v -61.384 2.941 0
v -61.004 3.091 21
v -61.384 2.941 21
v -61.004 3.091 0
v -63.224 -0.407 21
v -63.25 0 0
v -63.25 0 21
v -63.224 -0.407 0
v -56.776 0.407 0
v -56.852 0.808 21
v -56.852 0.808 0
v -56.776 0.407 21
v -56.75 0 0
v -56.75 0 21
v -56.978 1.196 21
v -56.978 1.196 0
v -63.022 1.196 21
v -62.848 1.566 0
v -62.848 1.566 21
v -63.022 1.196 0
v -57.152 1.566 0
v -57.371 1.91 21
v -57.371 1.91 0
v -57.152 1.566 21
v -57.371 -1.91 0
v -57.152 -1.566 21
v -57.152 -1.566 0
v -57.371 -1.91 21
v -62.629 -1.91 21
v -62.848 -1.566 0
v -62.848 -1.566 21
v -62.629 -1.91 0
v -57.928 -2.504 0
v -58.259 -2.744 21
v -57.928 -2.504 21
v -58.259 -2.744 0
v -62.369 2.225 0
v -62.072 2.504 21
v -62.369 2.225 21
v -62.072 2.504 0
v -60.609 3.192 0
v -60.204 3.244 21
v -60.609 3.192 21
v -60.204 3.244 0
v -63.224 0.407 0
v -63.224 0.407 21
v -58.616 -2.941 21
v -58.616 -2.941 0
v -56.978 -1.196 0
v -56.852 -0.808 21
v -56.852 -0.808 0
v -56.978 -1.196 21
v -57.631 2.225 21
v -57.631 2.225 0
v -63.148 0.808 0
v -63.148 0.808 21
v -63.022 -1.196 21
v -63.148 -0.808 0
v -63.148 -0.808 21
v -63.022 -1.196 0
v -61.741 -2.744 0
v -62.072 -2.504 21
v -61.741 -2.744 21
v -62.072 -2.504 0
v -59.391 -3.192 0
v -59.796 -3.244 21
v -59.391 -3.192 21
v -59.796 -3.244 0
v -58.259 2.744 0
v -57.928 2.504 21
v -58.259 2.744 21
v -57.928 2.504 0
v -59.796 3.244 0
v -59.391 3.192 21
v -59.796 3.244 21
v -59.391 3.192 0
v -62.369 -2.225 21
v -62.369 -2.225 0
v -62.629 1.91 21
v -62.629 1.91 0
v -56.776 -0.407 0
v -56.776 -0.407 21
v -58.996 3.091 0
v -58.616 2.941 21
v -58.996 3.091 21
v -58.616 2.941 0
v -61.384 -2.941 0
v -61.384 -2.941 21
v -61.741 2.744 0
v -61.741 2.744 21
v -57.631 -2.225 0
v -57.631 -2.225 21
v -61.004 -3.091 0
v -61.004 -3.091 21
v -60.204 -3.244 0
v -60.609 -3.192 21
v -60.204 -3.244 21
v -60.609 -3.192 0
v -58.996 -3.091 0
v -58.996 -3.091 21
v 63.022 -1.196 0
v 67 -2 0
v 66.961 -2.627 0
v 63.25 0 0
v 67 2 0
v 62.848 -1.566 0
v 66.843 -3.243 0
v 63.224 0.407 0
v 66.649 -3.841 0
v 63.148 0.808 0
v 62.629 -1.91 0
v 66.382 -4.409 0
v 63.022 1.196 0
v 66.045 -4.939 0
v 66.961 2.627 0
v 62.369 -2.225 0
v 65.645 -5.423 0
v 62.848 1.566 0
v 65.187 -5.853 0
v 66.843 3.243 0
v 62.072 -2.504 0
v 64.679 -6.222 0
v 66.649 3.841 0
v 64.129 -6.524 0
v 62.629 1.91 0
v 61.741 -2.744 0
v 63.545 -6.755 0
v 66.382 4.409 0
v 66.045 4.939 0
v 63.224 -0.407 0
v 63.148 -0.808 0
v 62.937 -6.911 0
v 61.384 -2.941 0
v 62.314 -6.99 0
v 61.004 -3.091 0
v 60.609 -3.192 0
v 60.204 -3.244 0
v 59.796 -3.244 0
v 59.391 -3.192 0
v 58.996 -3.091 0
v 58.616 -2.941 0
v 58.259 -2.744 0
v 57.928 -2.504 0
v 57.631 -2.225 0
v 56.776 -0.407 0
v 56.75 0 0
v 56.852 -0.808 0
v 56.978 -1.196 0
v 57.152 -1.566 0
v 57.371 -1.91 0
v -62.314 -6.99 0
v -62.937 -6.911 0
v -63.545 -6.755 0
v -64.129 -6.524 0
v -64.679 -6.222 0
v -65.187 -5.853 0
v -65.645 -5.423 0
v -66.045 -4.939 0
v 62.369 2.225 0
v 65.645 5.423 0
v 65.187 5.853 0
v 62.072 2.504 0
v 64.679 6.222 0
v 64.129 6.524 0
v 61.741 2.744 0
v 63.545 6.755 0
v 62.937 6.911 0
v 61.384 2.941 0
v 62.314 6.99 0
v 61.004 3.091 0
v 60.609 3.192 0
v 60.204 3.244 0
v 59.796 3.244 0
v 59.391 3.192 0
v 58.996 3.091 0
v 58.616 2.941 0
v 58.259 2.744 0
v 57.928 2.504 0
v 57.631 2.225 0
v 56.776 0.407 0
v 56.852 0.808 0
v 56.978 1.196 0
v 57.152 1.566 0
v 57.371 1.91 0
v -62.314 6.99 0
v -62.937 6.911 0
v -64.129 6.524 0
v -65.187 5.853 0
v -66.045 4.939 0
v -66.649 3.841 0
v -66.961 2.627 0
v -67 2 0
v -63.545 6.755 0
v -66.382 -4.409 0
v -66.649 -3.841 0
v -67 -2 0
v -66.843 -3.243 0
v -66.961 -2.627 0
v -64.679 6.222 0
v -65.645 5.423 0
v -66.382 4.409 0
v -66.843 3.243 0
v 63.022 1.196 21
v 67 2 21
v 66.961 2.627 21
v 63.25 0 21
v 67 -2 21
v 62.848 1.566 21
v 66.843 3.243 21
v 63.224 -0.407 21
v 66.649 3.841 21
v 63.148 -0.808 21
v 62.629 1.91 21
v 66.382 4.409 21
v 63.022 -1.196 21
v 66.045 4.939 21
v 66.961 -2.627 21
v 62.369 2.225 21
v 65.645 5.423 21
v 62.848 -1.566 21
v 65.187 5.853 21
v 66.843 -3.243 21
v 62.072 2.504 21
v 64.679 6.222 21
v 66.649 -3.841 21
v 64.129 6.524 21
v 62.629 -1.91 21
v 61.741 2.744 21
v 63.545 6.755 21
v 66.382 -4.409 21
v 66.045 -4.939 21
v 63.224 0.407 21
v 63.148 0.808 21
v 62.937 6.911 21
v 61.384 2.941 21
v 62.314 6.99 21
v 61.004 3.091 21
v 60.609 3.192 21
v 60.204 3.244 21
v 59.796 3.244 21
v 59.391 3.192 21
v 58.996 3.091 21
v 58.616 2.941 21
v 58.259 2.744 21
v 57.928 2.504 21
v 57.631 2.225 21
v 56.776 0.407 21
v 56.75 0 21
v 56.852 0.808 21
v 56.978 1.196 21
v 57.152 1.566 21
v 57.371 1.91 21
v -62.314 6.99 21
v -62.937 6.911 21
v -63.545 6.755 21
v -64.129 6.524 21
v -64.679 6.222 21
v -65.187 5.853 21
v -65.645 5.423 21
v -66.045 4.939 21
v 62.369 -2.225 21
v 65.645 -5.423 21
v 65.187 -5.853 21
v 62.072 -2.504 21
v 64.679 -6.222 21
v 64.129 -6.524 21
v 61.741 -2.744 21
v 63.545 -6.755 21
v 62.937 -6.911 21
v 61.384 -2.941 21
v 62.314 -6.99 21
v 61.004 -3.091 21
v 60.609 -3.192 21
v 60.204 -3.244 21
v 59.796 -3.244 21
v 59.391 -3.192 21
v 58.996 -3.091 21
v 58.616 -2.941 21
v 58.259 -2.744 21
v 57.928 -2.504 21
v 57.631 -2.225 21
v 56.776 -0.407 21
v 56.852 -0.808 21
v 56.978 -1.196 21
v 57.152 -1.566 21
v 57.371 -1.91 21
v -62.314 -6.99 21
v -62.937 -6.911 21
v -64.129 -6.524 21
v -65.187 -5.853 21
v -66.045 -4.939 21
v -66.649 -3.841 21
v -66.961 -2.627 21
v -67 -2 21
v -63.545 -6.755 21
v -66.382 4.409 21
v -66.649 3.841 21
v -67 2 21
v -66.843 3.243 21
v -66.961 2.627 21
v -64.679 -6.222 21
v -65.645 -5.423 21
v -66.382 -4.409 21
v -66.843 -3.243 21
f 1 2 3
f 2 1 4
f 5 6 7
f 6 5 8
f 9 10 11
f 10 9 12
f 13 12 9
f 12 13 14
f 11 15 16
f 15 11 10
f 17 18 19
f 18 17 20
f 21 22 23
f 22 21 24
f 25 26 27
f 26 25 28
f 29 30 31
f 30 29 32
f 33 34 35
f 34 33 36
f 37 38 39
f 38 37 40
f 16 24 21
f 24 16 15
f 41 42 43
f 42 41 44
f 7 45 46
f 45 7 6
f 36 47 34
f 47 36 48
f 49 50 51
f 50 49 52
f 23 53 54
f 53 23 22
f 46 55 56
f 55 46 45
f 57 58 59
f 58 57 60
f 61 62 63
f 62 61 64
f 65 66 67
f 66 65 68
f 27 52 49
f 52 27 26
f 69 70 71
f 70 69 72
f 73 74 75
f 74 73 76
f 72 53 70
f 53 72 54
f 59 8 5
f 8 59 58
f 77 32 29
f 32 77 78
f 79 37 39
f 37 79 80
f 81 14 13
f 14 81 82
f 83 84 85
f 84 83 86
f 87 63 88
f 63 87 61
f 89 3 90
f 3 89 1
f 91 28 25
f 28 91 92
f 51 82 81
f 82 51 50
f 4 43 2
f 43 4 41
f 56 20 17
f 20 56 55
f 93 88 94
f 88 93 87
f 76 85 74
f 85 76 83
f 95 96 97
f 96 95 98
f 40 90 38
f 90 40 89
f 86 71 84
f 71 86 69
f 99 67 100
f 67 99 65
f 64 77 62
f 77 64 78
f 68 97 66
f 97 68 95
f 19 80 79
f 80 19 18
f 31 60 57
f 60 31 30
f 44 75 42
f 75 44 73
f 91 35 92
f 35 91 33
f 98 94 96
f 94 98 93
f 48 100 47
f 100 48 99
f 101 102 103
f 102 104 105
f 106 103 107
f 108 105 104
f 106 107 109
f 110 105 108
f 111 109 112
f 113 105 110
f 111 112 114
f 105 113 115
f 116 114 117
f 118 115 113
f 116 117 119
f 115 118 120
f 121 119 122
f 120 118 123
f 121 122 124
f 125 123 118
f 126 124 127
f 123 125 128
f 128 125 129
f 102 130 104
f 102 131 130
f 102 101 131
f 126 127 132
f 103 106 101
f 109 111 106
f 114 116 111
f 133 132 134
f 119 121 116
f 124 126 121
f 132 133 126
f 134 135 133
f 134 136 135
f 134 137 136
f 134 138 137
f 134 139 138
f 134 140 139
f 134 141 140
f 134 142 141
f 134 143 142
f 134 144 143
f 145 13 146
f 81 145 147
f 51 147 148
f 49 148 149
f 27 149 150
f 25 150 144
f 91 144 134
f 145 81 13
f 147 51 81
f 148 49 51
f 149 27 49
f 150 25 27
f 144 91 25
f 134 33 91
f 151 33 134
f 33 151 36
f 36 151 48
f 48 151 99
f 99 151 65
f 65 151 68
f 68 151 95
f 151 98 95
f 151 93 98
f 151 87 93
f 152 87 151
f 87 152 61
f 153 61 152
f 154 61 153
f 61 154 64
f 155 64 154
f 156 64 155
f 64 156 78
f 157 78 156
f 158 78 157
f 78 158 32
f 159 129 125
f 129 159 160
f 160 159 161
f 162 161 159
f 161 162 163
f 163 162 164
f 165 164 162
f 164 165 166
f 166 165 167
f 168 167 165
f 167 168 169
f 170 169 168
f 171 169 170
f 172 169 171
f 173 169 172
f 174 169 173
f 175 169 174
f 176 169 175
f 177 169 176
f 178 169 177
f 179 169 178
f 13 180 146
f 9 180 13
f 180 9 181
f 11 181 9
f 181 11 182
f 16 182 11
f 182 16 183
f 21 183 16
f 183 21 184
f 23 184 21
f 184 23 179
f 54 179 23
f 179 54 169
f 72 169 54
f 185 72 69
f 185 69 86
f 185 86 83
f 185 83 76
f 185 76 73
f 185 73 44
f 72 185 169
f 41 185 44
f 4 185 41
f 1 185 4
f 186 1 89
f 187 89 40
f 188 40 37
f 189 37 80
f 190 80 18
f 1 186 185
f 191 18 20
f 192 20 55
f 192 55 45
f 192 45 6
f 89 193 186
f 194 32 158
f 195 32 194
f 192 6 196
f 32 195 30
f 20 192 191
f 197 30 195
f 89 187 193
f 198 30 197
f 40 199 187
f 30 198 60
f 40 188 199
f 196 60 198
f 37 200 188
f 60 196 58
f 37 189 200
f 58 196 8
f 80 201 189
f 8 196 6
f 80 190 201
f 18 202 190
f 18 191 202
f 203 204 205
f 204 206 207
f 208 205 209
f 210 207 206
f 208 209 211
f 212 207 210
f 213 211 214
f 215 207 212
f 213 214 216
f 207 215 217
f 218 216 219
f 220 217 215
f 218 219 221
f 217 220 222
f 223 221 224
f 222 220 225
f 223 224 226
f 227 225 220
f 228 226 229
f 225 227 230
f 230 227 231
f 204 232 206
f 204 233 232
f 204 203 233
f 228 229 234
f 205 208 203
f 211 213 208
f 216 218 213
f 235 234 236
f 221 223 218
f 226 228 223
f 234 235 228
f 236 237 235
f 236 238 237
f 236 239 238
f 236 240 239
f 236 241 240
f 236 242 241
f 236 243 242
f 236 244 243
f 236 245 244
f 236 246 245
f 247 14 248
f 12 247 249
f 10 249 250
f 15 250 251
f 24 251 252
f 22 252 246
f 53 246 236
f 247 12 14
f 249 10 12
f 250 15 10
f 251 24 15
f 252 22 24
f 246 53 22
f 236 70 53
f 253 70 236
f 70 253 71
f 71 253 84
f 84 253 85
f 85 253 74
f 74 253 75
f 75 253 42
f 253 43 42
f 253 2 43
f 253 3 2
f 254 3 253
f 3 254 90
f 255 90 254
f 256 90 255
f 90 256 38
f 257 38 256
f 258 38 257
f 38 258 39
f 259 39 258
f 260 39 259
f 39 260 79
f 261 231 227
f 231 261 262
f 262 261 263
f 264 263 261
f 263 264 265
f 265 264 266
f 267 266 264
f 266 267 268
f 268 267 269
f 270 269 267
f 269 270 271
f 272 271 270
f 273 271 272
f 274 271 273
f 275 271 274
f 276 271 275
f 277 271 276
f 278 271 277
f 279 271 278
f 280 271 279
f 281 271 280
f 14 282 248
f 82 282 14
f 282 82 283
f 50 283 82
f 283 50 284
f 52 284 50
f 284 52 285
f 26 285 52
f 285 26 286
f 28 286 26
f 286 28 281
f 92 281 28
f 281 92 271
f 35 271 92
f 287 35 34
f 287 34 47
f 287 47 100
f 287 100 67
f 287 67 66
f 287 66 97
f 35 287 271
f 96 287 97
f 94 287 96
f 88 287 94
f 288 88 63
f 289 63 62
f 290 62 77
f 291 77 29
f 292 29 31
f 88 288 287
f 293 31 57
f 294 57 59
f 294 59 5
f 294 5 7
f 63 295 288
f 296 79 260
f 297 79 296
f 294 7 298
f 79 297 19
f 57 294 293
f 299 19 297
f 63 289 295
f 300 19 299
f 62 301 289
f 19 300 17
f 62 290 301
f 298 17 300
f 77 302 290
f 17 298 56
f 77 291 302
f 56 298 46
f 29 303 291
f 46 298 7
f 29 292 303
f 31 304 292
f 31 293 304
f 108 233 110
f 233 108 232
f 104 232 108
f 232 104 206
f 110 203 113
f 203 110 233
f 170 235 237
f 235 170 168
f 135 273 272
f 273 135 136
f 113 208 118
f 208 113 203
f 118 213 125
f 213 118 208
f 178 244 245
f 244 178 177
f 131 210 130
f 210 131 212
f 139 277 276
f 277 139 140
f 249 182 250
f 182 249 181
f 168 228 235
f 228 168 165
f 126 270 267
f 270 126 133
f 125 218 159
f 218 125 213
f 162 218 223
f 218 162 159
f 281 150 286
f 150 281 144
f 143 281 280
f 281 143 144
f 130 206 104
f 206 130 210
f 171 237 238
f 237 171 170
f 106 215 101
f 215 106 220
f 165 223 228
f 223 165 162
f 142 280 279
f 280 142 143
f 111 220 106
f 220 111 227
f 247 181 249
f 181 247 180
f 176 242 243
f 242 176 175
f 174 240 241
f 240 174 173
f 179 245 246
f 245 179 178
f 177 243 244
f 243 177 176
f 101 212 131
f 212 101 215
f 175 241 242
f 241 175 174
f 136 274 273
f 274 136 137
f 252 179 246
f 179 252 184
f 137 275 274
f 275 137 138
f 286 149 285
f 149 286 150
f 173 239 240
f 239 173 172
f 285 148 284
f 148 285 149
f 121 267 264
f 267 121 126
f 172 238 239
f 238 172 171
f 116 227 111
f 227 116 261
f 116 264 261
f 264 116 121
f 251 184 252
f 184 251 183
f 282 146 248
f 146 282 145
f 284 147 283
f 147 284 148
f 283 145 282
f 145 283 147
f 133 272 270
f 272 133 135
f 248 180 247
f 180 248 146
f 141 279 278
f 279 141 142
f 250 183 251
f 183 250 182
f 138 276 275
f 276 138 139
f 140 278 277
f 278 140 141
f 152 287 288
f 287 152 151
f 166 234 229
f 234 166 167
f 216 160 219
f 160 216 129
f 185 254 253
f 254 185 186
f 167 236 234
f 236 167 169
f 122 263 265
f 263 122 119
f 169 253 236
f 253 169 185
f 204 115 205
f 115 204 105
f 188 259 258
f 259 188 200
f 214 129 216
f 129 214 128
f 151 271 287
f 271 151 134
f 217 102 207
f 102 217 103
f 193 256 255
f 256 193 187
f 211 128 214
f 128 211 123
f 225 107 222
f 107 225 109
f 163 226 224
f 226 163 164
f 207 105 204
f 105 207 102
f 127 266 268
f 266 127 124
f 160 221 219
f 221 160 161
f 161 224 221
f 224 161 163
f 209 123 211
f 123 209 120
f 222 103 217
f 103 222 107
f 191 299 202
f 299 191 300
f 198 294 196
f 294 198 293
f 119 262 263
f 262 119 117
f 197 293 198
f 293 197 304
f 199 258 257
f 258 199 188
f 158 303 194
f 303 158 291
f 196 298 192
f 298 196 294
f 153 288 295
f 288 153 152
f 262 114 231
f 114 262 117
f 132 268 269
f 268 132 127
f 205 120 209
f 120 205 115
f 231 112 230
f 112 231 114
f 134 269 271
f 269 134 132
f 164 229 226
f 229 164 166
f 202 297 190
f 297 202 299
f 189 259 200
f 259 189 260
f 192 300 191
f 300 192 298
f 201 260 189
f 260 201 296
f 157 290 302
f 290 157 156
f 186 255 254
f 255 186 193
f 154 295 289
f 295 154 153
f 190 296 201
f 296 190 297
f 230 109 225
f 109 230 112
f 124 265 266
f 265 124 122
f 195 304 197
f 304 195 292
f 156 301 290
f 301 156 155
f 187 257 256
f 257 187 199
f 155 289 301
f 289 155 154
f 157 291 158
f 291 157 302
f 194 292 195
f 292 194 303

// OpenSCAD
$fn = 50;


difference() {
	union() {
		hull() {
			translate(v = [-62.0000000000, 2.0000000000, 0]) {
				cylinder(h = 21, r = 5);
			}
			translate(v = [62.0000000000, 2.0000000000, 0]) {
				cylinder(h = 21, r = 5);
			}
			translate(v = [-62.0000000000, -2.0000000000, 0]) {
				cylinder(h = 21, r = 5);
			}
			translate(v = [62.0000000000, -2.0000000000, 0]) {
				cylinder(h = 21, r = 5);
			}
		}
	}
	union() {
		translate(v = [-60.0000000000, 0.0000000000, 0]) {
			cylinder(h = 21, r = 3.2500000000);
		}
		translate(v = [60.0000000000, 0.0000000000, 0]) {
			cylinder(h = 21, r = 3.2500000000);
		}
		translate(v = [-60.0000000000, 0.0000000000, 0]) {
			cylinder(h = 21, r = 1.8000000000);
		}
		translate(v = [60.0000000000, 0.0000000000, 0]) {
			cylinder(h = 21, r = 1.8000000000);
		}
		translate(v = [-60.0000000000, 0.0000000000, 0]) {
			cylinder(h = 21, r = 1.8000000000);
		}
		translate(v = [60.0000000000, 0.0000000000, 0]) {
			cylinder(h = 21, r = 1.8000000000);
		}
		translate(v = [-60.0000000000, 0.0000000000, 0]) {
			cylinder(h = 21, r = 1.8000000000);
		}
		translate(v = [60.0000000000, 0.0000000000, 0]) {
			cylinder(h = 21, r = 1.8000000000);
		}
	}
}
